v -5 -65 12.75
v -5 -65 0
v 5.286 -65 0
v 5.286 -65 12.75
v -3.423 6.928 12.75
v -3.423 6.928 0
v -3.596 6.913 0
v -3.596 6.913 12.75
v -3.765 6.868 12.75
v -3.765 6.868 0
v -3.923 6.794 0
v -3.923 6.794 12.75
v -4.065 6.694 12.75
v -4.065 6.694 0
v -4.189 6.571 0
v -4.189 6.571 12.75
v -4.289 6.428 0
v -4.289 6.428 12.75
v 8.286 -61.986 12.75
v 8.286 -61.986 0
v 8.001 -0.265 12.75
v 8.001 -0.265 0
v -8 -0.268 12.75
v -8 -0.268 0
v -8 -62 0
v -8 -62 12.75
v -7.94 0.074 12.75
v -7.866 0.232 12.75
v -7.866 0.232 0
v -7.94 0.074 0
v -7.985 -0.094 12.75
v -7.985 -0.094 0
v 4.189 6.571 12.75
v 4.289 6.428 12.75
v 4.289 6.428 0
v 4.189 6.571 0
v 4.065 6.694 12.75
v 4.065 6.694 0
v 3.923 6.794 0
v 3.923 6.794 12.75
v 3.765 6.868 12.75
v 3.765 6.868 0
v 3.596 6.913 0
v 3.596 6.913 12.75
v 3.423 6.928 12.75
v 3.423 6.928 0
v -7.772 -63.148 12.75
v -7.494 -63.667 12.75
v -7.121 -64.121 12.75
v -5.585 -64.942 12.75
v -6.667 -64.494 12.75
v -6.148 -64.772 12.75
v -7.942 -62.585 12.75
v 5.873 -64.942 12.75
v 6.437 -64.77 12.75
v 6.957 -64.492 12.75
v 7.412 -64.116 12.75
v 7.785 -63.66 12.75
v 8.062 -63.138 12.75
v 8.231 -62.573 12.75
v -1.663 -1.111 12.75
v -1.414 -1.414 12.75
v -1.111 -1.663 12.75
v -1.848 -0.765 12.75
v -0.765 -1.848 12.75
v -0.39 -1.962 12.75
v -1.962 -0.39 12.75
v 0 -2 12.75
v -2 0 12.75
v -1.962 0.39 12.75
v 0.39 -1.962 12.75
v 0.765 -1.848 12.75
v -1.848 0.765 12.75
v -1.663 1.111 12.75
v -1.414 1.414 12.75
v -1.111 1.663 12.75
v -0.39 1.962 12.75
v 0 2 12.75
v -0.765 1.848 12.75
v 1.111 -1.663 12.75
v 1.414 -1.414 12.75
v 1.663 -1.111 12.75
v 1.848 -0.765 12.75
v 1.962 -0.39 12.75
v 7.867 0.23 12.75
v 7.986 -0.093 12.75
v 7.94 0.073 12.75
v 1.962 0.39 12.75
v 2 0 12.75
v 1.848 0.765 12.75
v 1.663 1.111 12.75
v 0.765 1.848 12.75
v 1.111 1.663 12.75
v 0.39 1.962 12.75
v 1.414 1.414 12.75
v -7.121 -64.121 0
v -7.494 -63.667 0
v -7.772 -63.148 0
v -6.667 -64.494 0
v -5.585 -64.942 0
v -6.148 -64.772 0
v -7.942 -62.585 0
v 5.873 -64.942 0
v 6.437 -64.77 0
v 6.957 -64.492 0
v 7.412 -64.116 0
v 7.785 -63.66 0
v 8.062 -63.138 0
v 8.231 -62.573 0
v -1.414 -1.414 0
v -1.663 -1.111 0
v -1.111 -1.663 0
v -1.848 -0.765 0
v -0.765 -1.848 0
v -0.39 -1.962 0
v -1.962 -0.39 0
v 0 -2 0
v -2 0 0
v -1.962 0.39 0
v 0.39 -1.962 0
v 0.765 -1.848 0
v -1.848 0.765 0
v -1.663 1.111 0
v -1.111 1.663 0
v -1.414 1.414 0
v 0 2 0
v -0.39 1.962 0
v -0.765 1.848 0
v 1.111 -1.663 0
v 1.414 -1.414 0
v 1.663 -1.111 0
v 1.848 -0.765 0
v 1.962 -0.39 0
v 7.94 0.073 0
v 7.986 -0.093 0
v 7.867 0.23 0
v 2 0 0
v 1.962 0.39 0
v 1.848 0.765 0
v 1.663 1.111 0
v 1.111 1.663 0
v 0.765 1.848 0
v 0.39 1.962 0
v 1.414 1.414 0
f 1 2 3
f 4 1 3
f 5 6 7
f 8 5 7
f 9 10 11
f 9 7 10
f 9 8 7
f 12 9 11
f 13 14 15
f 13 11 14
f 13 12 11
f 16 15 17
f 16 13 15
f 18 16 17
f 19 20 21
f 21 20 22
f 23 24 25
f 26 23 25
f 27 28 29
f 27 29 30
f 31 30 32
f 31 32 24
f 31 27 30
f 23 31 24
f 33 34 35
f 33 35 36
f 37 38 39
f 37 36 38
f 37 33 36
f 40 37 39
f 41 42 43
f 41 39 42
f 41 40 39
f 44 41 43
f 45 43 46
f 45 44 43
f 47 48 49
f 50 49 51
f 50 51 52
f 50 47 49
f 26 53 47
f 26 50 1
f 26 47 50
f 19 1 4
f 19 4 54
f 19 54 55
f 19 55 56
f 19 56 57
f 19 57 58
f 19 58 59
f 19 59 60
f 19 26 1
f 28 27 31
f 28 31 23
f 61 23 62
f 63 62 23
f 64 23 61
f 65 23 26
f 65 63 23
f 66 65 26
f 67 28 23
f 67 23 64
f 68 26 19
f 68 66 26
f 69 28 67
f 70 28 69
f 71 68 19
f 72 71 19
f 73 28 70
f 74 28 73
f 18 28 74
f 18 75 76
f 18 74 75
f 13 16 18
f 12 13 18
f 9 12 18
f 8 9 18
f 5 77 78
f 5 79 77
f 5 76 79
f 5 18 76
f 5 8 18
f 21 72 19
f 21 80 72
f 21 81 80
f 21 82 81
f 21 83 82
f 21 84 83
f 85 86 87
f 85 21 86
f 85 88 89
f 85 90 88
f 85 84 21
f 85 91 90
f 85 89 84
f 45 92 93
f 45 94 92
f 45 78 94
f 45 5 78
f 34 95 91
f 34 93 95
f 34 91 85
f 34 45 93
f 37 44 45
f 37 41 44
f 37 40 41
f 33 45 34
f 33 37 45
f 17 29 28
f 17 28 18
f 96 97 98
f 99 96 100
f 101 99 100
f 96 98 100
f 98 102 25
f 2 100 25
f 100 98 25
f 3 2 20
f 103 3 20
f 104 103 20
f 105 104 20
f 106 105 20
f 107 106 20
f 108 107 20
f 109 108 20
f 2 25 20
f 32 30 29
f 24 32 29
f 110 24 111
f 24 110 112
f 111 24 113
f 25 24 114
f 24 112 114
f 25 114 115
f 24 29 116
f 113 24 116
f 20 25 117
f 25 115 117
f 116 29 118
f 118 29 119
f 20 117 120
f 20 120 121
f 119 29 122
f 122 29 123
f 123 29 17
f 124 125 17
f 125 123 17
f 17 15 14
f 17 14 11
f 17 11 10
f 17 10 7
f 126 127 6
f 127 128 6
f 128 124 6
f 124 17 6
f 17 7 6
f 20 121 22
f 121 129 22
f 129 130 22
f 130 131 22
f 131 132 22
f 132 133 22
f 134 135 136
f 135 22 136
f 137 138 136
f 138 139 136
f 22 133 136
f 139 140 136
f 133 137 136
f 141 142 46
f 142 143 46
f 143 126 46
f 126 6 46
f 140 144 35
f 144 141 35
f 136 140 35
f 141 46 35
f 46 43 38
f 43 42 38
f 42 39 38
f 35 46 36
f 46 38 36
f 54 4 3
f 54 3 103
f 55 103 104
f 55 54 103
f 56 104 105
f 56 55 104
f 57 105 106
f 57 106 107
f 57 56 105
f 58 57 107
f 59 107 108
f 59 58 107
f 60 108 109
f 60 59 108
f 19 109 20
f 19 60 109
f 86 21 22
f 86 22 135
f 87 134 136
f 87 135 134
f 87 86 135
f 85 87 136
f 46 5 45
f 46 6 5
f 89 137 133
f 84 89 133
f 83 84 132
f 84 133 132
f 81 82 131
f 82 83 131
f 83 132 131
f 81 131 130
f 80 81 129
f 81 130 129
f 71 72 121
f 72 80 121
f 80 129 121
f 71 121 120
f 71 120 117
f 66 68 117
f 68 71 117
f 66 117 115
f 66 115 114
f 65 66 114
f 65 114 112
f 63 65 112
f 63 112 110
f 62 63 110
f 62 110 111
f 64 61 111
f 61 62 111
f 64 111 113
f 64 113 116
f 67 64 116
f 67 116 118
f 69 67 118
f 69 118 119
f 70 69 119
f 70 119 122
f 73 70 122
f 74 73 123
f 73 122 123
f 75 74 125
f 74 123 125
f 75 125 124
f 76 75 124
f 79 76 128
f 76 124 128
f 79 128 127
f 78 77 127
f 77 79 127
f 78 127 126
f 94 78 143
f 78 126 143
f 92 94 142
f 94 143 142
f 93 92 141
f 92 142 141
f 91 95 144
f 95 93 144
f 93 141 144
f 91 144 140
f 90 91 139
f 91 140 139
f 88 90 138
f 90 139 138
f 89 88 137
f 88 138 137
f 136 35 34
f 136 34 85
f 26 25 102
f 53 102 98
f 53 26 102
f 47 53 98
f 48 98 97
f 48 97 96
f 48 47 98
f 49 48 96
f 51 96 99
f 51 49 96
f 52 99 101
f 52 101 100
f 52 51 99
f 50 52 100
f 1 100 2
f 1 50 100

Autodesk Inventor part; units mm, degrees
ref_plane "YZ Plane" through (0, 0, 0) normal (1, 0, 0) x (0, 1, 0)
ref_plane "XZ Plane" through (0, 0, 0) normal (0, 1, 0) x (-1, 0, 0)
ref_plane "XY Plane" through (0, 0, 0) normal (0, 0, 1) x (1, 0, 0)
sketch "Sketch1" plane through (0, 0, 0) normal (0, 0, 1) x (1, 0, 0)
  circle A0 centre (0, 0) radius 2
  line L0 (-8, 0) -> (-8, -65)
  line L1 (-8, -65) -> (8.3, -65)
  line L2 (8.3, -65) -> (8, 0)
  line L3 (-8, 0) -> (-4, 6.9282)
  line L4 (-4, 6.9282) -> (4, 6.9282)
  line L5 (4, 6.9282) -> (8, 0)
  dimension "d0" = 4
  dimension "d2" = 65
  dimension "d3" = 16.3
extrude "Extrusion1" add sketch "Sketch1" along normal blind 12.75
fillet "Fillet1" radius 1 4 edges at (-4, 6.9282, 6.375) (4, 6.9282, 6.375) (8, 0, 6.375) (-8, 0, 6.375)
fillet "Fillet2" radius 3 2 edges at (8.3, -65, 6.375) (-8, -65, 6.375)
properties part number "real arm"
